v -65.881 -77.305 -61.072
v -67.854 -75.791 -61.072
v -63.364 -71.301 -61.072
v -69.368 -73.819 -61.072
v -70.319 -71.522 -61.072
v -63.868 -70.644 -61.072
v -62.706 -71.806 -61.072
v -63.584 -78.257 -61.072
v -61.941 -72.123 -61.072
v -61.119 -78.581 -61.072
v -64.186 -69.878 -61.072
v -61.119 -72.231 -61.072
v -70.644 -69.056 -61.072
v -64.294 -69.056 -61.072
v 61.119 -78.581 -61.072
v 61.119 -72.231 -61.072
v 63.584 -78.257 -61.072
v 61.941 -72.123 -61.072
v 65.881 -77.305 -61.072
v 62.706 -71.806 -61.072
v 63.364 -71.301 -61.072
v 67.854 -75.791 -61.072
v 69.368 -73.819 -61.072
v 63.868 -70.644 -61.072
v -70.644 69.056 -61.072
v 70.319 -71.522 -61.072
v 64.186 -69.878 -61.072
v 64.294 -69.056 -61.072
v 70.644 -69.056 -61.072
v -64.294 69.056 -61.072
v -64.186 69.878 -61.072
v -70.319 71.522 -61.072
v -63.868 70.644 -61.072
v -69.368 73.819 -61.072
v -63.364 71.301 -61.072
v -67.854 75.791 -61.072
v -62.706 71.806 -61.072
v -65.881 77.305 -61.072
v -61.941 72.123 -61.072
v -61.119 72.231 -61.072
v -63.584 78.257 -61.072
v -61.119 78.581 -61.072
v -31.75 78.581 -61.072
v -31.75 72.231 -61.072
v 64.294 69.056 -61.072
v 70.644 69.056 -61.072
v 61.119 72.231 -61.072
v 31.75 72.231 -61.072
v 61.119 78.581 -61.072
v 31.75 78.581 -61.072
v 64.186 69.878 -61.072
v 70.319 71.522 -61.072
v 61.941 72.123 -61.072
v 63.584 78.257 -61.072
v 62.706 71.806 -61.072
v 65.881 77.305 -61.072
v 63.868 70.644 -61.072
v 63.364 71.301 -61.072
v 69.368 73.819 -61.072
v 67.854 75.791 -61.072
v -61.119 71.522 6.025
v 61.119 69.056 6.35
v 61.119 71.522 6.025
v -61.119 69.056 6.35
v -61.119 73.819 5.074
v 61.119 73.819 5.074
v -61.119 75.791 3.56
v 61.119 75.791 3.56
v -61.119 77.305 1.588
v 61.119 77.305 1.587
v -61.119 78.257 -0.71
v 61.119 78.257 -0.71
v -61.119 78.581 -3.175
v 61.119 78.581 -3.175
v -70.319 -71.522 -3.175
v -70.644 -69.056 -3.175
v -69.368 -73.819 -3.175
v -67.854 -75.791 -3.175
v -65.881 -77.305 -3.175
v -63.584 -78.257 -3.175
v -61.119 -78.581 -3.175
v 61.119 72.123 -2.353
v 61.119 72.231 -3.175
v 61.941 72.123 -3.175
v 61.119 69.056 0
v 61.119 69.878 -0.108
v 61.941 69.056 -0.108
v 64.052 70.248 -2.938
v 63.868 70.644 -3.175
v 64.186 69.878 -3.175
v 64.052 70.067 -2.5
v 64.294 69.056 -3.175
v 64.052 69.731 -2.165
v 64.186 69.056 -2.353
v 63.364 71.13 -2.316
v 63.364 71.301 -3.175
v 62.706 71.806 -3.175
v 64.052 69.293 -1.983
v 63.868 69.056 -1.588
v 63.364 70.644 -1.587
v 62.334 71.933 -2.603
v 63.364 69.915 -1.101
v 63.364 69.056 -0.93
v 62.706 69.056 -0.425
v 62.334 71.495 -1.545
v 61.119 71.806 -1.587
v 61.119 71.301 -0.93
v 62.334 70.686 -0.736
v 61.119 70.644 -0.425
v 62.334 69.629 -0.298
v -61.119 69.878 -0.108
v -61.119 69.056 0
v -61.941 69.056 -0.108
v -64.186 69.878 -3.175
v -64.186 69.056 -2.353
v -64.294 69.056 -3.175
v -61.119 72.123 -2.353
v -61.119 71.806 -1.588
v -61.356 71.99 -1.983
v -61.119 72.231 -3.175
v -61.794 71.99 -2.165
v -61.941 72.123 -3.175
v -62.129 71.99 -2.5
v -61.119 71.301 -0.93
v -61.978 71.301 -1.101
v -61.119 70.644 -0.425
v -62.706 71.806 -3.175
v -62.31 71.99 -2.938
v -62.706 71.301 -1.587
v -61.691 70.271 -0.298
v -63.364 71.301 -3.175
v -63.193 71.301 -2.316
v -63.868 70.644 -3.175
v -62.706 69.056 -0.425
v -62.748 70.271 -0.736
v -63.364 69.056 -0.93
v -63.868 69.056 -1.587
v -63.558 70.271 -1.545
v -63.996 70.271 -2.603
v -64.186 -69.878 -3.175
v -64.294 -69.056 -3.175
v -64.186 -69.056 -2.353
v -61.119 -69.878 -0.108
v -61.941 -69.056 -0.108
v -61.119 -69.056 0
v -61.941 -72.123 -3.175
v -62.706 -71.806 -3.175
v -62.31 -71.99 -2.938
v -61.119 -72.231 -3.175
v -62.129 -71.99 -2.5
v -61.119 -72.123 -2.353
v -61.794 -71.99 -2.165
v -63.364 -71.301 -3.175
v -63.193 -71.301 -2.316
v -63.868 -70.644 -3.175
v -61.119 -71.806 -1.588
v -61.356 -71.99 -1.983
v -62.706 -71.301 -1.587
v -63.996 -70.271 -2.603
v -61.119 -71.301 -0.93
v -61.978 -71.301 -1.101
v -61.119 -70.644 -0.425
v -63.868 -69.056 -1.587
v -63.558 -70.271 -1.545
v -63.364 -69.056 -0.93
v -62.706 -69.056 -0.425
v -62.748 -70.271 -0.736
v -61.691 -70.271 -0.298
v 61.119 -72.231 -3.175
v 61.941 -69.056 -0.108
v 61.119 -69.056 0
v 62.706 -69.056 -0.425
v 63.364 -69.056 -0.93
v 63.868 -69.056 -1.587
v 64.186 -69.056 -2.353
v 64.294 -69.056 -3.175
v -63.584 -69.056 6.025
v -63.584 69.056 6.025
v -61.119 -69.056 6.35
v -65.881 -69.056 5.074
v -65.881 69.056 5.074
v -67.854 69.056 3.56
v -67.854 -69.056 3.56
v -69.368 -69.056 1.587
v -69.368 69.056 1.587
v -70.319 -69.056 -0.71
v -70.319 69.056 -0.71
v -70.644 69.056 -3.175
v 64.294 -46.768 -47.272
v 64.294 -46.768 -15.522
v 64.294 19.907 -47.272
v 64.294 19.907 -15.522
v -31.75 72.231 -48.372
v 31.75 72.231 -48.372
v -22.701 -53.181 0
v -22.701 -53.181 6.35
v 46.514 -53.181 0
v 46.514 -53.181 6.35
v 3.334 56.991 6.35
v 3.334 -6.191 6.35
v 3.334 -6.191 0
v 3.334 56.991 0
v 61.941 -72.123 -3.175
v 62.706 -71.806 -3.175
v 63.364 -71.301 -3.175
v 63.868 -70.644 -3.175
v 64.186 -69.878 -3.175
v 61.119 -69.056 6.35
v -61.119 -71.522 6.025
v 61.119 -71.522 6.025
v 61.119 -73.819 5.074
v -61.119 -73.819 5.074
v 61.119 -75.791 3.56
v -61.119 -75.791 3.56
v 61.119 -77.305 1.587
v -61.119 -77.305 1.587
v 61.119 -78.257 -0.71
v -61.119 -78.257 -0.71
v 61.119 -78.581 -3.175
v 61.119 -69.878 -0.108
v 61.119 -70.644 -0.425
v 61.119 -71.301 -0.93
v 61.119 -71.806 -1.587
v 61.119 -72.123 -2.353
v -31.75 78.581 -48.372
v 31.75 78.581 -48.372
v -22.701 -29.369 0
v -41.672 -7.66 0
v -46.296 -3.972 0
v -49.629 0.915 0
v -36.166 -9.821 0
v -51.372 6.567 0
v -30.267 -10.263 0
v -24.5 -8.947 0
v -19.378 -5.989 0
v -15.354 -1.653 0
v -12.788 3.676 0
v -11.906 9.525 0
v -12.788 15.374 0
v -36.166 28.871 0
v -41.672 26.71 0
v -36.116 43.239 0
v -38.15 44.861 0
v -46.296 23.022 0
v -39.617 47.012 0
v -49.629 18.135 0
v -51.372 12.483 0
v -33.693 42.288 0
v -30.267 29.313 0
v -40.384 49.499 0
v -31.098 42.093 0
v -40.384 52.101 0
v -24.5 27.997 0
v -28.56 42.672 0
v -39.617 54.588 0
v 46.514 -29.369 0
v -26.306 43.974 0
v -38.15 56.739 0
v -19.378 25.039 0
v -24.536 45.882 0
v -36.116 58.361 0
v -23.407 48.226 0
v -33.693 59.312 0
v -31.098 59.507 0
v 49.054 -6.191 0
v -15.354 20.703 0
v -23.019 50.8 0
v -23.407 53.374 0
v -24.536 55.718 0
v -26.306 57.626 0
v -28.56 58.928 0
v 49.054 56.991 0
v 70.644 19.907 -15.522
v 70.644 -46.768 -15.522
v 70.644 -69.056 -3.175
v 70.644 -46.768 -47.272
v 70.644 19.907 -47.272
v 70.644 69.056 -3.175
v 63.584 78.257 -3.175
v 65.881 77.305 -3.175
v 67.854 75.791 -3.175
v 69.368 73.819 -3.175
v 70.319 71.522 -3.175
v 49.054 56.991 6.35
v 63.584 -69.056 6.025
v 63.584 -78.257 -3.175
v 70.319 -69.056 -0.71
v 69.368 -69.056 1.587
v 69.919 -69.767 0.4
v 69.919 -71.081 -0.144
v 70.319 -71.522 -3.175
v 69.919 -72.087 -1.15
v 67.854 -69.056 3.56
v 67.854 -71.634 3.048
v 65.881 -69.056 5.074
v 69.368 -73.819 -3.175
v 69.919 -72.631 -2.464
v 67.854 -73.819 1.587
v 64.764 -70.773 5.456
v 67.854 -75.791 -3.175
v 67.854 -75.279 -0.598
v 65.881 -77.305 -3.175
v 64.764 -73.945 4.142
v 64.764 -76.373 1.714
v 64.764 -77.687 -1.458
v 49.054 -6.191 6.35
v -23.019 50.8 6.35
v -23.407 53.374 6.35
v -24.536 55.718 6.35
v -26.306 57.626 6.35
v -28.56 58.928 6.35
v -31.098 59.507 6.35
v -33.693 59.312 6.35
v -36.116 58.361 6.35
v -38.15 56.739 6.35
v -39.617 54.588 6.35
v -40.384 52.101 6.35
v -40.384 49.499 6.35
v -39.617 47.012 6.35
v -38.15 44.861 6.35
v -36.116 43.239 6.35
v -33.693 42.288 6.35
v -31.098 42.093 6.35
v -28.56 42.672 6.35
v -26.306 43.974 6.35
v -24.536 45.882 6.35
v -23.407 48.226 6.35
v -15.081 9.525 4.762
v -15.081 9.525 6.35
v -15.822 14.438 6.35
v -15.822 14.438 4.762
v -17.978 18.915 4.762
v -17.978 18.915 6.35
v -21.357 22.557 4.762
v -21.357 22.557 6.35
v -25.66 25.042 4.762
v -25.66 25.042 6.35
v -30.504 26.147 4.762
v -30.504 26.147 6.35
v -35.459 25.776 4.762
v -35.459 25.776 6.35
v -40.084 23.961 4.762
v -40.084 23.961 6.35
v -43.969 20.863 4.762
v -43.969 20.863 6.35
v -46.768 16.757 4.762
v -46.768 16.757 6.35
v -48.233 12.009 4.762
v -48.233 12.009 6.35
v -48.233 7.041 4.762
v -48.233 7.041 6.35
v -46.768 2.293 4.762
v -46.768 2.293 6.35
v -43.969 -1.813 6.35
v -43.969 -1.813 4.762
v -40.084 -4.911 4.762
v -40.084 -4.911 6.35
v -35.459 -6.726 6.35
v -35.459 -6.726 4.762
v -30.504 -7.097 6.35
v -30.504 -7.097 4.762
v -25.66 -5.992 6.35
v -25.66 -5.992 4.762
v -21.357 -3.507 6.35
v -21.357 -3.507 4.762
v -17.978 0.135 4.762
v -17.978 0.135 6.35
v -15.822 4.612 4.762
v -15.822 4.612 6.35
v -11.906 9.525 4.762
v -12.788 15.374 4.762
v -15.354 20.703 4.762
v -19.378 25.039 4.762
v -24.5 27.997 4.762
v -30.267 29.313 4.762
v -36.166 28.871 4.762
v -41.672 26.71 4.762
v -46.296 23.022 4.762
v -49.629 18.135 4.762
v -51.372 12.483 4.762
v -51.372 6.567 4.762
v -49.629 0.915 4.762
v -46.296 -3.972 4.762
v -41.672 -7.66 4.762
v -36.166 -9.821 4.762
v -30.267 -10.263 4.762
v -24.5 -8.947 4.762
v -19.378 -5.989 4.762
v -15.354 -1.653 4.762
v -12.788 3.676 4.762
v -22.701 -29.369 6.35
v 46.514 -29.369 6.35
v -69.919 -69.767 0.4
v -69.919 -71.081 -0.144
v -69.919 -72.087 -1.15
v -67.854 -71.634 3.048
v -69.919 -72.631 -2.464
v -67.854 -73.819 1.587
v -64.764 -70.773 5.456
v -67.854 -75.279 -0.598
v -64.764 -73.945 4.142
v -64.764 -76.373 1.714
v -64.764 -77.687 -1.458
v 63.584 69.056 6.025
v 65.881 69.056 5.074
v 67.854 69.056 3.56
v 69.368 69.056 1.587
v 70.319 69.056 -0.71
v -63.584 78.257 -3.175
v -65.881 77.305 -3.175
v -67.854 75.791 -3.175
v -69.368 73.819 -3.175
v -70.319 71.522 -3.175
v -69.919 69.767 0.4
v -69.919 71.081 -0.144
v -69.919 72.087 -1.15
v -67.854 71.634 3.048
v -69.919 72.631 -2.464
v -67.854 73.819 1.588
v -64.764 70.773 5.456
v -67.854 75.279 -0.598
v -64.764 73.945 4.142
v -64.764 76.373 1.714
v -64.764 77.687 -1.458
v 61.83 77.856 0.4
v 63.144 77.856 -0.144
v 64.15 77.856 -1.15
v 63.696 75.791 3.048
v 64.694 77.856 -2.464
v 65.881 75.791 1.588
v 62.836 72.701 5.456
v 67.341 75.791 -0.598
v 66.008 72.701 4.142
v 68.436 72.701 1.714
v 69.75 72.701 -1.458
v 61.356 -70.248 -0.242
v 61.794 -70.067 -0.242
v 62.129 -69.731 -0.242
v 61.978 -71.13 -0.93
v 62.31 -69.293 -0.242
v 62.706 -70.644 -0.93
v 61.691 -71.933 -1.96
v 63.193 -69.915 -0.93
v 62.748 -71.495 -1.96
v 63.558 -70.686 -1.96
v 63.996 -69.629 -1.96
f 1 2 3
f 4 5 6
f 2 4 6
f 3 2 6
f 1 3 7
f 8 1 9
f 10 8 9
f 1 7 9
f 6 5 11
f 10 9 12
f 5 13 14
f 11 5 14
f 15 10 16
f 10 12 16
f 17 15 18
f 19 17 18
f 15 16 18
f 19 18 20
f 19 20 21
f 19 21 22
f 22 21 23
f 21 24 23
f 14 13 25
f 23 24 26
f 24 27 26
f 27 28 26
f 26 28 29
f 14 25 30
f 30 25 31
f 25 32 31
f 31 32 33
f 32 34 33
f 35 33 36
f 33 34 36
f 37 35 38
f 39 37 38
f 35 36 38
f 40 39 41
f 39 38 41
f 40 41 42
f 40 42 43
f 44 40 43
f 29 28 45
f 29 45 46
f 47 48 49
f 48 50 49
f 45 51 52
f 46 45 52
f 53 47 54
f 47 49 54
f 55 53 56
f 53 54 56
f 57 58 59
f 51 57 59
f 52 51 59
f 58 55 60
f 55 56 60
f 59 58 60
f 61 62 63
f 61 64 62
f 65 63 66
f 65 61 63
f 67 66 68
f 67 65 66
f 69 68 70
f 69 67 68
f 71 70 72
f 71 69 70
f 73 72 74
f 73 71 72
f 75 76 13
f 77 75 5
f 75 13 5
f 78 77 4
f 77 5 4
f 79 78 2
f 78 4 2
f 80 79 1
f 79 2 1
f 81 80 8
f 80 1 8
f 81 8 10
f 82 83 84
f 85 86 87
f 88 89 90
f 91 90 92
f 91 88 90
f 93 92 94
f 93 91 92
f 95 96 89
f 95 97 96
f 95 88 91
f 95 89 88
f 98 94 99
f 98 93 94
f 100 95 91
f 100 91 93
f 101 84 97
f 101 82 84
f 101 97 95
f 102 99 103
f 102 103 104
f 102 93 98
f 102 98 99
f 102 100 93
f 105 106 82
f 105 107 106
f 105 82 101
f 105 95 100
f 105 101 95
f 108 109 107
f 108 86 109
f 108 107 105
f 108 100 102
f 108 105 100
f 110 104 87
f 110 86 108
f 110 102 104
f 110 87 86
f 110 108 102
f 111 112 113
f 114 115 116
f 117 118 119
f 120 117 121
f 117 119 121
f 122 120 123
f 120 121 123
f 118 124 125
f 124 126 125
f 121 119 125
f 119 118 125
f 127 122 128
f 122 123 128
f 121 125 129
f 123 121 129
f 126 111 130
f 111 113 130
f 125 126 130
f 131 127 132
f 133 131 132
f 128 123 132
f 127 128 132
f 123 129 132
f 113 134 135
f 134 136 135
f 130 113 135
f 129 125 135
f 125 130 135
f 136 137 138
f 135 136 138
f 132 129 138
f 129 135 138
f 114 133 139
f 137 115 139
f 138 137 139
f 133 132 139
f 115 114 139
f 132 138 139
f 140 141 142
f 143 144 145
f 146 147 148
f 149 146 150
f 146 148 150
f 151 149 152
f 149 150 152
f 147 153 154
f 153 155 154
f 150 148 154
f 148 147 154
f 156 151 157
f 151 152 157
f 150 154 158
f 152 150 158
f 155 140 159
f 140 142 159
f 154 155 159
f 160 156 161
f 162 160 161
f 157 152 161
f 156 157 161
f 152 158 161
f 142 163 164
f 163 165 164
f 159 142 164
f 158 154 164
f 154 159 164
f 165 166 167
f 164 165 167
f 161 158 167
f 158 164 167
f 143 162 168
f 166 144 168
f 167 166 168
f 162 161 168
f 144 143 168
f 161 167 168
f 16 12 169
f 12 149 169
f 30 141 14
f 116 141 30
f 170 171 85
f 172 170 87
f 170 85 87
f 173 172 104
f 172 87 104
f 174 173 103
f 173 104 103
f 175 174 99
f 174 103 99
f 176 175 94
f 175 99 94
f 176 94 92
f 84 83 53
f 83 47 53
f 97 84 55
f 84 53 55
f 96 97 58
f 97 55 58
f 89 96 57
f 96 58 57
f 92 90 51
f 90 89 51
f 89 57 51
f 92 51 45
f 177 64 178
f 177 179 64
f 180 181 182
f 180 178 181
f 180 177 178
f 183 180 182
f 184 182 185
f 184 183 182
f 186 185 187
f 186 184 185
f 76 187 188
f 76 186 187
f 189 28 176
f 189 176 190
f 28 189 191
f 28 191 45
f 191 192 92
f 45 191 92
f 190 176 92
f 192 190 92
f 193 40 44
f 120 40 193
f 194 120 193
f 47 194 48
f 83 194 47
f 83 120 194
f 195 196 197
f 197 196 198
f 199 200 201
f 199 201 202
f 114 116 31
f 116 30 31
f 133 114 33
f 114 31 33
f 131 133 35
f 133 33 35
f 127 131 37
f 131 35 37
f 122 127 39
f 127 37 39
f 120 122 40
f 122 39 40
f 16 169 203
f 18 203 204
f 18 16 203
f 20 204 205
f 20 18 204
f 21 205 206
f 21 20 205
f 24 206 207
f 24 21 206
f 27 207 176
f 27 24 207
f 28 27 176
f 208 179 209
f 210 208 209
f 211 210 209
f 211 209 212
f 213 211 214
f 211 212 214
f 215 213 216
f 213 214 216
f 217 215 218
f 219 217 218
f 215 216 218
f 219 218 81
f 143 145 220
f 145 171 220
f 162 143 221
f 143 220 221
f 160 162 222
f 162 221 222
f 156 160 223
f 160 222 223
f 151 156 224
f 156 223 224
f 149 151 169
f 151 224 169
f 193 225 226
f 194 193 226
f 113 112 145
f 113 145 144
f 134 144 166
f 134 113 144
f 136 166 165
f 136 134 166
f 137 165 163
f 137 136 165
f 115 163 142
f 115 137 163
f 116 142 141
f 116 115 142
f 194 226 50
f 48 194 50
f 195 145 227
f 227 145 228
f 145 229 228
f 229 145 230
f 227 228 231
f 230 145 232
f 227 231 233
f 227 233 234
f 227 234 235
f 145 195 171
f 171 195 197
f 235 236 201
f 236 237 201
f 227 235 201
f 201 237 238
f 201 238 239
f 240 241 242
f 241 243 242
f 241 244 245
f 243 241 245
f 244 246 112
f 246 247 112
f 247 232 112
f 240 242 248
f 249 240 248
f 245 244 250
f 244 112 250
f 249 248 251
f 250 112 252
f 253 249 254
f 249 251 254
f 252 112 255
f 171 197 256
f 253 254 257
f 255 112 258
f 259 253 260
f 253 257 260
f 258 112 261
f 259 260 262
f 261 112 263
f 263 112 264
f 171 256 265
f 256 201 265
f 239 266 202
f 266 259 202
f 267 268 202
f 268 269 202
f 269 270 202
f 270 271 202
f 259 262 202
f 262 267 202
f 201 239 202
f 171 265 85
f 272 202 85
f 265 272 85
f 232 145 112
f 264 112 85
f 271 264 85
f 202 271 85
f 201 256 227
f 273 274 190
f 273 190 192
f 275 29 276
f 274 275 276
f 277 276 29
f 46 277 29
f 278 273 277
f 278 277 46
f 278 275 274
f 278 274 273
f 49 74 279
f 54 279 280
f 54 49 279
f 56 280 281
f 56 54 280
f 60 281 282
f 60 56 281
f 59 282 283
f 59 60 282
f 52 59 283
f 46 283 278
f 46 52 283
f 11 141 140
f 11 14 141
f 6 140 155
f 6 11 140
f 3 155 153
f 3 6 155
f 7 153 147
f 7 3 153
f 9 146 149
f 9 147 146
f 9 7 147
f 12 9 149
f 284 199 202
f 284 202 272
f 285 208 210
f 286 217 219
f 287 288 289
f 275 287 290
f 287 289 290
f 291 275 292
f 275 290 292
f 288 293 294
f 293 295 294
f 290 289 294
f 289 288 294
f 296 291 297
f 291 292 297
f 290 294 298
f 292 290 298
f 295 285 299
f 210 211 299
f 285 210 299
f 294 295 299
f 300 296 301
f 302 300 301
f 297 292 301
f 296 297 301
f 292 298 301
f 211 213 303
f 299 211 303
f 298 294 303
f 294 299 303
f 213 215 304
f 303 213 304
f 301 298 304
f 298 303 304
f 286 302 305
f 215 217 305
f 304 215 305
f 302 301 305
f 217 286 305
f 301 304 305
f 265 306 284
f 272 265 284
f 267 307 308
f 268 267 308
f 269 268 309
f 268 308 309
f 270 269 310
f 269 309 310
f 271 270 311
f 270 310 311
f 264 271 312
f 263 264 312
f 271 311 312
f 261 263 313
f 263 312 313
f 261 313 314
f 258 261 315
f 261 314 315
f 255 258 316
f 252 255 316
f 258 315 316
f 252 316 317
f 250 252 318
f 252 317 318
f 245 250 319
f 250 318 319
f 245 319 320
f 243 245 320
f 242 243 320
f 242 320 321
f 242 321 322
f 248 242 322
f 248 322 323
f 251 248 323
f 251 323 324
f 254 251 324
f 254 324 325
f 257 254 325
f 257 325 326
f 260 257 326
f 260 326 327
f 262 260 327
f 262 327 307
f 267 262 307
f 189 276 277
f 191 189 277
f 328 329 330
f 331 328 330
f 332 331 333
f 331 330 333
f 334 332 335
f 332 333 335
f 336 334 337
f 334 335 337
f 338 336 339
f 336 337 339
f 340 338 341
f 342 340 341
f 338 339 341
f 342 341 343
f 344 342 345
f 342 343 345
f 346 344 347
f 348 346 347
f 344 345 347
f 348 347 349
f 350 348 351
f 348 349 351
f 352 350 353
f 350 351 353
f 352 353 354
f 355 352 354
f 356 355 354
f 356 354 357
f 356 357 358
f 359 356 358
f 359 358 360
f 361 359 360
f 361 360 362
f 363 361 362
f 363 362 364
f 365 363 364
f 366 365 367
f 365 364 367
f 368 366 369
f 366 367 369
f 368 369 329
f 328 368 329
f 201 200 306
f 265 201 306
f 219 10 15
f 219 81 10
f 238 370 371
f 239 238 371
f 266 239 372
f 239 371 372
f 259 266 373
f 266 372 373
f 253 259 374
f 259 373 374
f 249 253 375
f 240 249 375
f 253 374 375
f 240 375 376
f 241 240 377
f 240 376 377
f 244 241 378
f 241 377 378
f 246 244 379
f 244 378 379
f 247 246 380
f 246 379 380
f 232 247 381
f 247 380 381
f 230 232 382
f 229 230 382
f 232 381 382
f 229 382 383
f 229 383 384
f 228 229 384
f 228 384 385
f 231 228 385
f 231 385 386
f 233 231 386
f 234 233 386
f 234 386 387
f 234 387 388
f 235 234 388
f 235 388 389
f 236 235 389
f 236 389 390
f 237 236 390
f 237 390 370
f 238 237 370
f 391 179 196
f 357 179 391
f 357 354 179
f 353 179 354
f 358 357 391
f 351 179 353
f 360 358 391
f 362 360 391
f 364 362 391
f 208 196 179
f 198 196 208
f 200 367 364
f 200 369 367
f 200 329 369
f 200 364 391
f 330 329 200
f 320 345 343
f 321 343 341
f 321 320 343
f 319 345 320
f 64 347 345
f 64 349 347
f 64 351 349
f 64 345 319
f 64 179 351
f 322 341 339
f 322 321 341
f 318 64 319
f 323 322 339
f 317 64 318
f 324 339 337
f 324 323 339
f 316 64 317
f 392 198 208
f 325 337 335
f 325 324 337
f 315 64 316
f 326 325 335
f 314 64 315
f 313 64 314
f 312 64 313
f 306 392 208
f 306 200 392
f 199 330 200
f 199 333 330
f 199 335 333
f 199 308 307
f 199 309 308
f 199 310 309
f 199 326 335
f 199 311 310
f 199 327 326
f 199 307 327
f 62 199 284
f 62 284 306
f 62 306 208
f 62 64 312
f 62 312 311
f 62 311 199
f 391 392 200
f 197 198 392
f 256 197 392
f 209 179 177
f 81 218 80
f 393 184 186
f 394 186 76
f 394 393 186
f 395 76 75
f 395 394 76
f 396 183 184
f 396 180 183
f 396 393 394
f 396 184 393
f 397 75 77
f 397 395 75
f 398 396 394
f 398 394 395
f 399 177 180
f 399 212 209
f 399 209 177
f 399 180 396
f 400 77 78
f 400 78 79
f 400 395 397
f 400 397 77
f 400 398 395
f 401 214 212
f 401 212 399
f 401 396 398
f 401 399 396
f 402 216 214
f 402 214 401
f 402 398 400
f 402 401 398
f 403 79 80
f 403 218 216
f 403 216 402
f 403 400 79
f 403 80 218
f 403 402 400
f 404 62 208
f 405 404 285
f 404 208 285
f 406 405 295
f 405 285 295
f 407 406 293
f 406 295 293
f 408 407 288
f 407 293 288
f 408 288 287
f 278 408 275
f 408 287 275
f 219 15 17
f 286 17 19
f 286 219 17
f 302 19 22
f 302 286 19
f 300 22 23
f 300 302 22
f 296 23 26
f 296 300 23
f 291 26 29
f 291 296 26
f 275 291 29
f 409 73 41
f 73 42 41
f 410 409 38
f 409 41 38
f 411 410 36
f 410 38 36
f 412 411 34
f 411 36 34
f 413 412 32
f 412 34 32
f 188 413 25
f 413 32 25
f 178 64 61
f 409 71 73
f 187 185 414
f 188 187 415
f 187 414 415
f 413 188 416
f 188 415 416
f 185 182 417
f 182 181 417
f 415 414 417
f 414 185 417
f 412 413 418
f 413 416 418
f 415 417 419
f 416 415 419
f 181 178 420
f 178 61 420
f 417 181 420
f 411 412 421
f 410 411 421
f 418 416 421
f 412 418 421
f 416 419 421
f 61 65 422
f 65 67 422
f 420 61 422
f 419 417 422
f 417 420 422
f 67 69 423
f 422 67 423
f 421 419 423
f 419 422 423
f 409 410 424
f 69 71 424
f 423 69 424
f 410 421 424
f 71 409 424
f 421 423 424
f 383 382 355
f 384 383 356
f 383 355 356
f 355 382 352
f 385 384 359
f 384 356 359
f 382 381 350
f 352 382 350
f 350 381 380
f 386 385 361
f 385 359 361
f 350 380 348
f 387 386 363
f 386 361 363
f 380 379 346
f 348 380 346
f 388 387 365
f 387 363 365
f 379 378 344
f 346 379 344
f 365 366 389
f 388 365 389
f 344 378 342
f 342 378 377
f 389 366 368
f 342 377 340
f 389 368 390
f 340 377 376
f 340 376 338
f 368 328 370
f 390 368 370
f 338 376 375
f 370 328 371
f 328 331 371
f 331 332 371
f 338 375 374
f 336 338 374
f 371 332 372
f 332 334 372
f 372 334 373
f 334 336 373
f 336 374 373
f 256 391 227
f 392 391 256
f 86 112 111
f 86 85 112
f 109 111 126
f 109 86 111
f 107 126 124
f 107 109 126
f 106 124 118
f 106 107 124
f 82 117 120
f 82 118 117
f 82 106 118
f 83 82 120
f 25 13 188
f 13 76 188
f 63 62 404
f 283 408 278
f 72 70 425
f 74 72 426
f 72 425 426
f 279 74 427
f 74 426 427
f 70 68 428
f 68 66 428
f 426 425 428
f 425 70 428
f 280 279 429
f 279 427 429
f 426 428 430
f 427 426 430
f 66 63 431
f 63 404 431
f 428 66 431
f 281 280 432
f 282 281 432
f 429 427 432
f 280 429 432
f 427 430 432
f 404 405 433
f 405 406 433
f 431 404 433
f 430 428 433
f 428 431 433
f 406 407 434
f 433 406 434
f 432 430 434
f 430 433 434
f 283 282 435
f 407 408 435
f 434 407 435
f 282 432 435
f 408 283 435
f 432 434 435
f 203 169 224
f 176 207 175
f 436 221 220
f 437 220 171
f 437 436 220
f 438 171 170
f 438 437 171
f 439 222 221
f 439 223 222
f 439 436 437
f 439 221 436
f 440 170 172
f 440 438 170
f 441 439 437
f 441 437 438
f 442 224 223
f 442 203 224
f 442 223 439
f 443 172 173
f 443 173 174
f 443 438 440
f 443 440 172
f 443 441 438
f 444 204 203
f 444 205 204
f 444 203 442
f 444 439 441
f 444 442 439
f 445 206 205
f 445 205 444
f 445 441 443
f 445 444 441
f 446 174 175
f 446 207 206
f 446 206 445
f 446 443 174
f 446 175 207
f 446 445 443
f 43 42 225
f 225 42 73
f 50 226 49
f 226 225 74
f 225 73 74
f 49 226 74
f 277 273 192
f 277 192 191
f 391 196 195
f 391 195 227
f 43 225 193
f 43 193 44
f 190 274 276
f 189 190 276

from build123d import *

# Parameters (mm, degrees)
SKETCH1_W           = 128.5875
SKETCH1_H           = 144.4625
BOSS_EXTRUDE1_DEPTH = 61.07176
SHELL1_T            = 6.35
SKETCH2_R           = 8.73125
SKETCH2_R_2         = 19.84375
SKETCH2_W           = 45.72
SKETCH2_H           = 63.1825
SKETCH2_W_2         = 69.215
SKETCH2_H_2         = 23.8125
CUT_EXTRUDE1_DEPTH  = 126.344509202
SKETCH3_W           = 31.75
SKETCH3_H           = 66.675
CUT_EXTRUDE2_DEPTH  = 6.35
SKETCH4_R           = 19.84375
SKETCH4_R_2         = 16.66875
BOSS_EXTRUDE2_DEPTH = 1.5875
SKETCH5_W           = 63.5
SKETCH5_H           = 12.7
CUT_EXTRUDE3_DEPTH  = 6.35
FILLET1_R           = 9.525
FILLET2_R           = 3.175


with BuildPart() as part:
    # Sketch1 → Boss-Extrude1 (new body)
    with BuildSketch(Plane.XY):
        Rectangle(SKETCH1_W, SKETCH1_H)
    extrude(amount=-BOSS_EXTRUDE1_DEPTH)

    # Shell1
    shell1_openings = [part.faces().sort_by_distance(p)[0] for p in [
        (0, 0, -61.07176),
    ]]
    offset(amount=SHELL1_T, openings=shell1_openings, kind=Kind.INTERSECTION)

    # Sketch2 → Cut-Extrude1 (cut, through all)
    with BuildSketch(Plane.XY.offset(6.35)):
        with Locations((-31.75, 50.8)):
            Circle(SKETCH2_R)
        with Locations((-31.75, 9.525)):
            Circle(SKETCH2_R_2)
        with Locations((26.19375, 25.4)):
            Rectangle(SKETCH2_W, SKETCH2_H)
        with Locations((11.90625, -41.275)):
            Rectangle(SKETCH2_W_2, SKETCH2_H_2)
    extrude(amount=-CUT_EXTRUDE1_DEPTH, mode=Mode.SUBTRACT)

    # Sketch3 → Cut-Extrude2 (cut)
    with BuildSketch(Plane(origin=(70.64375, 0, 0), x_dir=(0, 0, -1), z_dir=(1, 0, 0))):
        with Locations((31.39694, -13.43025)):
            Rectangle(SKETCH3_W, SKETCH3_H)
    extrude(amount=-CUT_EXTRUDE2_DEPTH, mode=Mode.SUBTRACT)

    # Sketch4 → Boss-Extrude2 (add)
    with BuildSketch(Plane.XY.offset(6.35)):
        with Locations((-31.75, 9.525)):
            Circle(SKETCH4_R)
        with Locations((-31.75, 9.525)):
            Circle(SKETCH4_R_2, mode=Mode.SUBTRACT)
    extrude(amount=-BOSS_EXTRUDE2_DEPTH)

    # Sketch5 → Cut-Extrude3 (cut)
    with BuildSketch(Plane(origin=(0, 78.58125, 0), x_dir=(1, 0, 0), z_dir=(0, 1, 0))):
        with Locations((0, 54.72176)):
            Rectangle(SKETCH5_W, SKETCH5_H)
    extrude(amount=-CUT_EXTRUDE3_DEPTH, mode=Mode.SUBTRACT)

    # Fillet1
    fillet1_edges = [part.edges().sort_by_distance(p)[0] for p in [
        (0, -78.58125, 6.35),
        (70.64375, 0, 6.35),
        (0, 78.58125, 6.35),
        (-70.64375, 0, 6.35),
        (-70.64375, -78.58125, -27.36088),
        (70.64375, -78.58125, -27.36088),
        (70.64375, 78.58125, -27.36088),
        (-70.64375, 78.58125, -27.36088),
    ]]
    fillet(fillet1_edges, radius=FILLET1_R)

    # Fillet2
    fillet2_edges = [part.edges().sort_by_distance(p)[0] for p in [
        (-64.29375, 0, 0),
        (-64.29375, -72.23125, -30.53588),
        (0, 72.23125, 0),
        (-64.29375, 72.23125, -30.53588),
        (64.29375, 72.23125, -30.53588),
        (64.29375, -72.23125, -30.53588),
        (0, -72.23125, 0),
        (64.29375, 0, 0),
    ]]
    fillet(fillet2_edges, radius=FILLET2_R)


solid = part.part
